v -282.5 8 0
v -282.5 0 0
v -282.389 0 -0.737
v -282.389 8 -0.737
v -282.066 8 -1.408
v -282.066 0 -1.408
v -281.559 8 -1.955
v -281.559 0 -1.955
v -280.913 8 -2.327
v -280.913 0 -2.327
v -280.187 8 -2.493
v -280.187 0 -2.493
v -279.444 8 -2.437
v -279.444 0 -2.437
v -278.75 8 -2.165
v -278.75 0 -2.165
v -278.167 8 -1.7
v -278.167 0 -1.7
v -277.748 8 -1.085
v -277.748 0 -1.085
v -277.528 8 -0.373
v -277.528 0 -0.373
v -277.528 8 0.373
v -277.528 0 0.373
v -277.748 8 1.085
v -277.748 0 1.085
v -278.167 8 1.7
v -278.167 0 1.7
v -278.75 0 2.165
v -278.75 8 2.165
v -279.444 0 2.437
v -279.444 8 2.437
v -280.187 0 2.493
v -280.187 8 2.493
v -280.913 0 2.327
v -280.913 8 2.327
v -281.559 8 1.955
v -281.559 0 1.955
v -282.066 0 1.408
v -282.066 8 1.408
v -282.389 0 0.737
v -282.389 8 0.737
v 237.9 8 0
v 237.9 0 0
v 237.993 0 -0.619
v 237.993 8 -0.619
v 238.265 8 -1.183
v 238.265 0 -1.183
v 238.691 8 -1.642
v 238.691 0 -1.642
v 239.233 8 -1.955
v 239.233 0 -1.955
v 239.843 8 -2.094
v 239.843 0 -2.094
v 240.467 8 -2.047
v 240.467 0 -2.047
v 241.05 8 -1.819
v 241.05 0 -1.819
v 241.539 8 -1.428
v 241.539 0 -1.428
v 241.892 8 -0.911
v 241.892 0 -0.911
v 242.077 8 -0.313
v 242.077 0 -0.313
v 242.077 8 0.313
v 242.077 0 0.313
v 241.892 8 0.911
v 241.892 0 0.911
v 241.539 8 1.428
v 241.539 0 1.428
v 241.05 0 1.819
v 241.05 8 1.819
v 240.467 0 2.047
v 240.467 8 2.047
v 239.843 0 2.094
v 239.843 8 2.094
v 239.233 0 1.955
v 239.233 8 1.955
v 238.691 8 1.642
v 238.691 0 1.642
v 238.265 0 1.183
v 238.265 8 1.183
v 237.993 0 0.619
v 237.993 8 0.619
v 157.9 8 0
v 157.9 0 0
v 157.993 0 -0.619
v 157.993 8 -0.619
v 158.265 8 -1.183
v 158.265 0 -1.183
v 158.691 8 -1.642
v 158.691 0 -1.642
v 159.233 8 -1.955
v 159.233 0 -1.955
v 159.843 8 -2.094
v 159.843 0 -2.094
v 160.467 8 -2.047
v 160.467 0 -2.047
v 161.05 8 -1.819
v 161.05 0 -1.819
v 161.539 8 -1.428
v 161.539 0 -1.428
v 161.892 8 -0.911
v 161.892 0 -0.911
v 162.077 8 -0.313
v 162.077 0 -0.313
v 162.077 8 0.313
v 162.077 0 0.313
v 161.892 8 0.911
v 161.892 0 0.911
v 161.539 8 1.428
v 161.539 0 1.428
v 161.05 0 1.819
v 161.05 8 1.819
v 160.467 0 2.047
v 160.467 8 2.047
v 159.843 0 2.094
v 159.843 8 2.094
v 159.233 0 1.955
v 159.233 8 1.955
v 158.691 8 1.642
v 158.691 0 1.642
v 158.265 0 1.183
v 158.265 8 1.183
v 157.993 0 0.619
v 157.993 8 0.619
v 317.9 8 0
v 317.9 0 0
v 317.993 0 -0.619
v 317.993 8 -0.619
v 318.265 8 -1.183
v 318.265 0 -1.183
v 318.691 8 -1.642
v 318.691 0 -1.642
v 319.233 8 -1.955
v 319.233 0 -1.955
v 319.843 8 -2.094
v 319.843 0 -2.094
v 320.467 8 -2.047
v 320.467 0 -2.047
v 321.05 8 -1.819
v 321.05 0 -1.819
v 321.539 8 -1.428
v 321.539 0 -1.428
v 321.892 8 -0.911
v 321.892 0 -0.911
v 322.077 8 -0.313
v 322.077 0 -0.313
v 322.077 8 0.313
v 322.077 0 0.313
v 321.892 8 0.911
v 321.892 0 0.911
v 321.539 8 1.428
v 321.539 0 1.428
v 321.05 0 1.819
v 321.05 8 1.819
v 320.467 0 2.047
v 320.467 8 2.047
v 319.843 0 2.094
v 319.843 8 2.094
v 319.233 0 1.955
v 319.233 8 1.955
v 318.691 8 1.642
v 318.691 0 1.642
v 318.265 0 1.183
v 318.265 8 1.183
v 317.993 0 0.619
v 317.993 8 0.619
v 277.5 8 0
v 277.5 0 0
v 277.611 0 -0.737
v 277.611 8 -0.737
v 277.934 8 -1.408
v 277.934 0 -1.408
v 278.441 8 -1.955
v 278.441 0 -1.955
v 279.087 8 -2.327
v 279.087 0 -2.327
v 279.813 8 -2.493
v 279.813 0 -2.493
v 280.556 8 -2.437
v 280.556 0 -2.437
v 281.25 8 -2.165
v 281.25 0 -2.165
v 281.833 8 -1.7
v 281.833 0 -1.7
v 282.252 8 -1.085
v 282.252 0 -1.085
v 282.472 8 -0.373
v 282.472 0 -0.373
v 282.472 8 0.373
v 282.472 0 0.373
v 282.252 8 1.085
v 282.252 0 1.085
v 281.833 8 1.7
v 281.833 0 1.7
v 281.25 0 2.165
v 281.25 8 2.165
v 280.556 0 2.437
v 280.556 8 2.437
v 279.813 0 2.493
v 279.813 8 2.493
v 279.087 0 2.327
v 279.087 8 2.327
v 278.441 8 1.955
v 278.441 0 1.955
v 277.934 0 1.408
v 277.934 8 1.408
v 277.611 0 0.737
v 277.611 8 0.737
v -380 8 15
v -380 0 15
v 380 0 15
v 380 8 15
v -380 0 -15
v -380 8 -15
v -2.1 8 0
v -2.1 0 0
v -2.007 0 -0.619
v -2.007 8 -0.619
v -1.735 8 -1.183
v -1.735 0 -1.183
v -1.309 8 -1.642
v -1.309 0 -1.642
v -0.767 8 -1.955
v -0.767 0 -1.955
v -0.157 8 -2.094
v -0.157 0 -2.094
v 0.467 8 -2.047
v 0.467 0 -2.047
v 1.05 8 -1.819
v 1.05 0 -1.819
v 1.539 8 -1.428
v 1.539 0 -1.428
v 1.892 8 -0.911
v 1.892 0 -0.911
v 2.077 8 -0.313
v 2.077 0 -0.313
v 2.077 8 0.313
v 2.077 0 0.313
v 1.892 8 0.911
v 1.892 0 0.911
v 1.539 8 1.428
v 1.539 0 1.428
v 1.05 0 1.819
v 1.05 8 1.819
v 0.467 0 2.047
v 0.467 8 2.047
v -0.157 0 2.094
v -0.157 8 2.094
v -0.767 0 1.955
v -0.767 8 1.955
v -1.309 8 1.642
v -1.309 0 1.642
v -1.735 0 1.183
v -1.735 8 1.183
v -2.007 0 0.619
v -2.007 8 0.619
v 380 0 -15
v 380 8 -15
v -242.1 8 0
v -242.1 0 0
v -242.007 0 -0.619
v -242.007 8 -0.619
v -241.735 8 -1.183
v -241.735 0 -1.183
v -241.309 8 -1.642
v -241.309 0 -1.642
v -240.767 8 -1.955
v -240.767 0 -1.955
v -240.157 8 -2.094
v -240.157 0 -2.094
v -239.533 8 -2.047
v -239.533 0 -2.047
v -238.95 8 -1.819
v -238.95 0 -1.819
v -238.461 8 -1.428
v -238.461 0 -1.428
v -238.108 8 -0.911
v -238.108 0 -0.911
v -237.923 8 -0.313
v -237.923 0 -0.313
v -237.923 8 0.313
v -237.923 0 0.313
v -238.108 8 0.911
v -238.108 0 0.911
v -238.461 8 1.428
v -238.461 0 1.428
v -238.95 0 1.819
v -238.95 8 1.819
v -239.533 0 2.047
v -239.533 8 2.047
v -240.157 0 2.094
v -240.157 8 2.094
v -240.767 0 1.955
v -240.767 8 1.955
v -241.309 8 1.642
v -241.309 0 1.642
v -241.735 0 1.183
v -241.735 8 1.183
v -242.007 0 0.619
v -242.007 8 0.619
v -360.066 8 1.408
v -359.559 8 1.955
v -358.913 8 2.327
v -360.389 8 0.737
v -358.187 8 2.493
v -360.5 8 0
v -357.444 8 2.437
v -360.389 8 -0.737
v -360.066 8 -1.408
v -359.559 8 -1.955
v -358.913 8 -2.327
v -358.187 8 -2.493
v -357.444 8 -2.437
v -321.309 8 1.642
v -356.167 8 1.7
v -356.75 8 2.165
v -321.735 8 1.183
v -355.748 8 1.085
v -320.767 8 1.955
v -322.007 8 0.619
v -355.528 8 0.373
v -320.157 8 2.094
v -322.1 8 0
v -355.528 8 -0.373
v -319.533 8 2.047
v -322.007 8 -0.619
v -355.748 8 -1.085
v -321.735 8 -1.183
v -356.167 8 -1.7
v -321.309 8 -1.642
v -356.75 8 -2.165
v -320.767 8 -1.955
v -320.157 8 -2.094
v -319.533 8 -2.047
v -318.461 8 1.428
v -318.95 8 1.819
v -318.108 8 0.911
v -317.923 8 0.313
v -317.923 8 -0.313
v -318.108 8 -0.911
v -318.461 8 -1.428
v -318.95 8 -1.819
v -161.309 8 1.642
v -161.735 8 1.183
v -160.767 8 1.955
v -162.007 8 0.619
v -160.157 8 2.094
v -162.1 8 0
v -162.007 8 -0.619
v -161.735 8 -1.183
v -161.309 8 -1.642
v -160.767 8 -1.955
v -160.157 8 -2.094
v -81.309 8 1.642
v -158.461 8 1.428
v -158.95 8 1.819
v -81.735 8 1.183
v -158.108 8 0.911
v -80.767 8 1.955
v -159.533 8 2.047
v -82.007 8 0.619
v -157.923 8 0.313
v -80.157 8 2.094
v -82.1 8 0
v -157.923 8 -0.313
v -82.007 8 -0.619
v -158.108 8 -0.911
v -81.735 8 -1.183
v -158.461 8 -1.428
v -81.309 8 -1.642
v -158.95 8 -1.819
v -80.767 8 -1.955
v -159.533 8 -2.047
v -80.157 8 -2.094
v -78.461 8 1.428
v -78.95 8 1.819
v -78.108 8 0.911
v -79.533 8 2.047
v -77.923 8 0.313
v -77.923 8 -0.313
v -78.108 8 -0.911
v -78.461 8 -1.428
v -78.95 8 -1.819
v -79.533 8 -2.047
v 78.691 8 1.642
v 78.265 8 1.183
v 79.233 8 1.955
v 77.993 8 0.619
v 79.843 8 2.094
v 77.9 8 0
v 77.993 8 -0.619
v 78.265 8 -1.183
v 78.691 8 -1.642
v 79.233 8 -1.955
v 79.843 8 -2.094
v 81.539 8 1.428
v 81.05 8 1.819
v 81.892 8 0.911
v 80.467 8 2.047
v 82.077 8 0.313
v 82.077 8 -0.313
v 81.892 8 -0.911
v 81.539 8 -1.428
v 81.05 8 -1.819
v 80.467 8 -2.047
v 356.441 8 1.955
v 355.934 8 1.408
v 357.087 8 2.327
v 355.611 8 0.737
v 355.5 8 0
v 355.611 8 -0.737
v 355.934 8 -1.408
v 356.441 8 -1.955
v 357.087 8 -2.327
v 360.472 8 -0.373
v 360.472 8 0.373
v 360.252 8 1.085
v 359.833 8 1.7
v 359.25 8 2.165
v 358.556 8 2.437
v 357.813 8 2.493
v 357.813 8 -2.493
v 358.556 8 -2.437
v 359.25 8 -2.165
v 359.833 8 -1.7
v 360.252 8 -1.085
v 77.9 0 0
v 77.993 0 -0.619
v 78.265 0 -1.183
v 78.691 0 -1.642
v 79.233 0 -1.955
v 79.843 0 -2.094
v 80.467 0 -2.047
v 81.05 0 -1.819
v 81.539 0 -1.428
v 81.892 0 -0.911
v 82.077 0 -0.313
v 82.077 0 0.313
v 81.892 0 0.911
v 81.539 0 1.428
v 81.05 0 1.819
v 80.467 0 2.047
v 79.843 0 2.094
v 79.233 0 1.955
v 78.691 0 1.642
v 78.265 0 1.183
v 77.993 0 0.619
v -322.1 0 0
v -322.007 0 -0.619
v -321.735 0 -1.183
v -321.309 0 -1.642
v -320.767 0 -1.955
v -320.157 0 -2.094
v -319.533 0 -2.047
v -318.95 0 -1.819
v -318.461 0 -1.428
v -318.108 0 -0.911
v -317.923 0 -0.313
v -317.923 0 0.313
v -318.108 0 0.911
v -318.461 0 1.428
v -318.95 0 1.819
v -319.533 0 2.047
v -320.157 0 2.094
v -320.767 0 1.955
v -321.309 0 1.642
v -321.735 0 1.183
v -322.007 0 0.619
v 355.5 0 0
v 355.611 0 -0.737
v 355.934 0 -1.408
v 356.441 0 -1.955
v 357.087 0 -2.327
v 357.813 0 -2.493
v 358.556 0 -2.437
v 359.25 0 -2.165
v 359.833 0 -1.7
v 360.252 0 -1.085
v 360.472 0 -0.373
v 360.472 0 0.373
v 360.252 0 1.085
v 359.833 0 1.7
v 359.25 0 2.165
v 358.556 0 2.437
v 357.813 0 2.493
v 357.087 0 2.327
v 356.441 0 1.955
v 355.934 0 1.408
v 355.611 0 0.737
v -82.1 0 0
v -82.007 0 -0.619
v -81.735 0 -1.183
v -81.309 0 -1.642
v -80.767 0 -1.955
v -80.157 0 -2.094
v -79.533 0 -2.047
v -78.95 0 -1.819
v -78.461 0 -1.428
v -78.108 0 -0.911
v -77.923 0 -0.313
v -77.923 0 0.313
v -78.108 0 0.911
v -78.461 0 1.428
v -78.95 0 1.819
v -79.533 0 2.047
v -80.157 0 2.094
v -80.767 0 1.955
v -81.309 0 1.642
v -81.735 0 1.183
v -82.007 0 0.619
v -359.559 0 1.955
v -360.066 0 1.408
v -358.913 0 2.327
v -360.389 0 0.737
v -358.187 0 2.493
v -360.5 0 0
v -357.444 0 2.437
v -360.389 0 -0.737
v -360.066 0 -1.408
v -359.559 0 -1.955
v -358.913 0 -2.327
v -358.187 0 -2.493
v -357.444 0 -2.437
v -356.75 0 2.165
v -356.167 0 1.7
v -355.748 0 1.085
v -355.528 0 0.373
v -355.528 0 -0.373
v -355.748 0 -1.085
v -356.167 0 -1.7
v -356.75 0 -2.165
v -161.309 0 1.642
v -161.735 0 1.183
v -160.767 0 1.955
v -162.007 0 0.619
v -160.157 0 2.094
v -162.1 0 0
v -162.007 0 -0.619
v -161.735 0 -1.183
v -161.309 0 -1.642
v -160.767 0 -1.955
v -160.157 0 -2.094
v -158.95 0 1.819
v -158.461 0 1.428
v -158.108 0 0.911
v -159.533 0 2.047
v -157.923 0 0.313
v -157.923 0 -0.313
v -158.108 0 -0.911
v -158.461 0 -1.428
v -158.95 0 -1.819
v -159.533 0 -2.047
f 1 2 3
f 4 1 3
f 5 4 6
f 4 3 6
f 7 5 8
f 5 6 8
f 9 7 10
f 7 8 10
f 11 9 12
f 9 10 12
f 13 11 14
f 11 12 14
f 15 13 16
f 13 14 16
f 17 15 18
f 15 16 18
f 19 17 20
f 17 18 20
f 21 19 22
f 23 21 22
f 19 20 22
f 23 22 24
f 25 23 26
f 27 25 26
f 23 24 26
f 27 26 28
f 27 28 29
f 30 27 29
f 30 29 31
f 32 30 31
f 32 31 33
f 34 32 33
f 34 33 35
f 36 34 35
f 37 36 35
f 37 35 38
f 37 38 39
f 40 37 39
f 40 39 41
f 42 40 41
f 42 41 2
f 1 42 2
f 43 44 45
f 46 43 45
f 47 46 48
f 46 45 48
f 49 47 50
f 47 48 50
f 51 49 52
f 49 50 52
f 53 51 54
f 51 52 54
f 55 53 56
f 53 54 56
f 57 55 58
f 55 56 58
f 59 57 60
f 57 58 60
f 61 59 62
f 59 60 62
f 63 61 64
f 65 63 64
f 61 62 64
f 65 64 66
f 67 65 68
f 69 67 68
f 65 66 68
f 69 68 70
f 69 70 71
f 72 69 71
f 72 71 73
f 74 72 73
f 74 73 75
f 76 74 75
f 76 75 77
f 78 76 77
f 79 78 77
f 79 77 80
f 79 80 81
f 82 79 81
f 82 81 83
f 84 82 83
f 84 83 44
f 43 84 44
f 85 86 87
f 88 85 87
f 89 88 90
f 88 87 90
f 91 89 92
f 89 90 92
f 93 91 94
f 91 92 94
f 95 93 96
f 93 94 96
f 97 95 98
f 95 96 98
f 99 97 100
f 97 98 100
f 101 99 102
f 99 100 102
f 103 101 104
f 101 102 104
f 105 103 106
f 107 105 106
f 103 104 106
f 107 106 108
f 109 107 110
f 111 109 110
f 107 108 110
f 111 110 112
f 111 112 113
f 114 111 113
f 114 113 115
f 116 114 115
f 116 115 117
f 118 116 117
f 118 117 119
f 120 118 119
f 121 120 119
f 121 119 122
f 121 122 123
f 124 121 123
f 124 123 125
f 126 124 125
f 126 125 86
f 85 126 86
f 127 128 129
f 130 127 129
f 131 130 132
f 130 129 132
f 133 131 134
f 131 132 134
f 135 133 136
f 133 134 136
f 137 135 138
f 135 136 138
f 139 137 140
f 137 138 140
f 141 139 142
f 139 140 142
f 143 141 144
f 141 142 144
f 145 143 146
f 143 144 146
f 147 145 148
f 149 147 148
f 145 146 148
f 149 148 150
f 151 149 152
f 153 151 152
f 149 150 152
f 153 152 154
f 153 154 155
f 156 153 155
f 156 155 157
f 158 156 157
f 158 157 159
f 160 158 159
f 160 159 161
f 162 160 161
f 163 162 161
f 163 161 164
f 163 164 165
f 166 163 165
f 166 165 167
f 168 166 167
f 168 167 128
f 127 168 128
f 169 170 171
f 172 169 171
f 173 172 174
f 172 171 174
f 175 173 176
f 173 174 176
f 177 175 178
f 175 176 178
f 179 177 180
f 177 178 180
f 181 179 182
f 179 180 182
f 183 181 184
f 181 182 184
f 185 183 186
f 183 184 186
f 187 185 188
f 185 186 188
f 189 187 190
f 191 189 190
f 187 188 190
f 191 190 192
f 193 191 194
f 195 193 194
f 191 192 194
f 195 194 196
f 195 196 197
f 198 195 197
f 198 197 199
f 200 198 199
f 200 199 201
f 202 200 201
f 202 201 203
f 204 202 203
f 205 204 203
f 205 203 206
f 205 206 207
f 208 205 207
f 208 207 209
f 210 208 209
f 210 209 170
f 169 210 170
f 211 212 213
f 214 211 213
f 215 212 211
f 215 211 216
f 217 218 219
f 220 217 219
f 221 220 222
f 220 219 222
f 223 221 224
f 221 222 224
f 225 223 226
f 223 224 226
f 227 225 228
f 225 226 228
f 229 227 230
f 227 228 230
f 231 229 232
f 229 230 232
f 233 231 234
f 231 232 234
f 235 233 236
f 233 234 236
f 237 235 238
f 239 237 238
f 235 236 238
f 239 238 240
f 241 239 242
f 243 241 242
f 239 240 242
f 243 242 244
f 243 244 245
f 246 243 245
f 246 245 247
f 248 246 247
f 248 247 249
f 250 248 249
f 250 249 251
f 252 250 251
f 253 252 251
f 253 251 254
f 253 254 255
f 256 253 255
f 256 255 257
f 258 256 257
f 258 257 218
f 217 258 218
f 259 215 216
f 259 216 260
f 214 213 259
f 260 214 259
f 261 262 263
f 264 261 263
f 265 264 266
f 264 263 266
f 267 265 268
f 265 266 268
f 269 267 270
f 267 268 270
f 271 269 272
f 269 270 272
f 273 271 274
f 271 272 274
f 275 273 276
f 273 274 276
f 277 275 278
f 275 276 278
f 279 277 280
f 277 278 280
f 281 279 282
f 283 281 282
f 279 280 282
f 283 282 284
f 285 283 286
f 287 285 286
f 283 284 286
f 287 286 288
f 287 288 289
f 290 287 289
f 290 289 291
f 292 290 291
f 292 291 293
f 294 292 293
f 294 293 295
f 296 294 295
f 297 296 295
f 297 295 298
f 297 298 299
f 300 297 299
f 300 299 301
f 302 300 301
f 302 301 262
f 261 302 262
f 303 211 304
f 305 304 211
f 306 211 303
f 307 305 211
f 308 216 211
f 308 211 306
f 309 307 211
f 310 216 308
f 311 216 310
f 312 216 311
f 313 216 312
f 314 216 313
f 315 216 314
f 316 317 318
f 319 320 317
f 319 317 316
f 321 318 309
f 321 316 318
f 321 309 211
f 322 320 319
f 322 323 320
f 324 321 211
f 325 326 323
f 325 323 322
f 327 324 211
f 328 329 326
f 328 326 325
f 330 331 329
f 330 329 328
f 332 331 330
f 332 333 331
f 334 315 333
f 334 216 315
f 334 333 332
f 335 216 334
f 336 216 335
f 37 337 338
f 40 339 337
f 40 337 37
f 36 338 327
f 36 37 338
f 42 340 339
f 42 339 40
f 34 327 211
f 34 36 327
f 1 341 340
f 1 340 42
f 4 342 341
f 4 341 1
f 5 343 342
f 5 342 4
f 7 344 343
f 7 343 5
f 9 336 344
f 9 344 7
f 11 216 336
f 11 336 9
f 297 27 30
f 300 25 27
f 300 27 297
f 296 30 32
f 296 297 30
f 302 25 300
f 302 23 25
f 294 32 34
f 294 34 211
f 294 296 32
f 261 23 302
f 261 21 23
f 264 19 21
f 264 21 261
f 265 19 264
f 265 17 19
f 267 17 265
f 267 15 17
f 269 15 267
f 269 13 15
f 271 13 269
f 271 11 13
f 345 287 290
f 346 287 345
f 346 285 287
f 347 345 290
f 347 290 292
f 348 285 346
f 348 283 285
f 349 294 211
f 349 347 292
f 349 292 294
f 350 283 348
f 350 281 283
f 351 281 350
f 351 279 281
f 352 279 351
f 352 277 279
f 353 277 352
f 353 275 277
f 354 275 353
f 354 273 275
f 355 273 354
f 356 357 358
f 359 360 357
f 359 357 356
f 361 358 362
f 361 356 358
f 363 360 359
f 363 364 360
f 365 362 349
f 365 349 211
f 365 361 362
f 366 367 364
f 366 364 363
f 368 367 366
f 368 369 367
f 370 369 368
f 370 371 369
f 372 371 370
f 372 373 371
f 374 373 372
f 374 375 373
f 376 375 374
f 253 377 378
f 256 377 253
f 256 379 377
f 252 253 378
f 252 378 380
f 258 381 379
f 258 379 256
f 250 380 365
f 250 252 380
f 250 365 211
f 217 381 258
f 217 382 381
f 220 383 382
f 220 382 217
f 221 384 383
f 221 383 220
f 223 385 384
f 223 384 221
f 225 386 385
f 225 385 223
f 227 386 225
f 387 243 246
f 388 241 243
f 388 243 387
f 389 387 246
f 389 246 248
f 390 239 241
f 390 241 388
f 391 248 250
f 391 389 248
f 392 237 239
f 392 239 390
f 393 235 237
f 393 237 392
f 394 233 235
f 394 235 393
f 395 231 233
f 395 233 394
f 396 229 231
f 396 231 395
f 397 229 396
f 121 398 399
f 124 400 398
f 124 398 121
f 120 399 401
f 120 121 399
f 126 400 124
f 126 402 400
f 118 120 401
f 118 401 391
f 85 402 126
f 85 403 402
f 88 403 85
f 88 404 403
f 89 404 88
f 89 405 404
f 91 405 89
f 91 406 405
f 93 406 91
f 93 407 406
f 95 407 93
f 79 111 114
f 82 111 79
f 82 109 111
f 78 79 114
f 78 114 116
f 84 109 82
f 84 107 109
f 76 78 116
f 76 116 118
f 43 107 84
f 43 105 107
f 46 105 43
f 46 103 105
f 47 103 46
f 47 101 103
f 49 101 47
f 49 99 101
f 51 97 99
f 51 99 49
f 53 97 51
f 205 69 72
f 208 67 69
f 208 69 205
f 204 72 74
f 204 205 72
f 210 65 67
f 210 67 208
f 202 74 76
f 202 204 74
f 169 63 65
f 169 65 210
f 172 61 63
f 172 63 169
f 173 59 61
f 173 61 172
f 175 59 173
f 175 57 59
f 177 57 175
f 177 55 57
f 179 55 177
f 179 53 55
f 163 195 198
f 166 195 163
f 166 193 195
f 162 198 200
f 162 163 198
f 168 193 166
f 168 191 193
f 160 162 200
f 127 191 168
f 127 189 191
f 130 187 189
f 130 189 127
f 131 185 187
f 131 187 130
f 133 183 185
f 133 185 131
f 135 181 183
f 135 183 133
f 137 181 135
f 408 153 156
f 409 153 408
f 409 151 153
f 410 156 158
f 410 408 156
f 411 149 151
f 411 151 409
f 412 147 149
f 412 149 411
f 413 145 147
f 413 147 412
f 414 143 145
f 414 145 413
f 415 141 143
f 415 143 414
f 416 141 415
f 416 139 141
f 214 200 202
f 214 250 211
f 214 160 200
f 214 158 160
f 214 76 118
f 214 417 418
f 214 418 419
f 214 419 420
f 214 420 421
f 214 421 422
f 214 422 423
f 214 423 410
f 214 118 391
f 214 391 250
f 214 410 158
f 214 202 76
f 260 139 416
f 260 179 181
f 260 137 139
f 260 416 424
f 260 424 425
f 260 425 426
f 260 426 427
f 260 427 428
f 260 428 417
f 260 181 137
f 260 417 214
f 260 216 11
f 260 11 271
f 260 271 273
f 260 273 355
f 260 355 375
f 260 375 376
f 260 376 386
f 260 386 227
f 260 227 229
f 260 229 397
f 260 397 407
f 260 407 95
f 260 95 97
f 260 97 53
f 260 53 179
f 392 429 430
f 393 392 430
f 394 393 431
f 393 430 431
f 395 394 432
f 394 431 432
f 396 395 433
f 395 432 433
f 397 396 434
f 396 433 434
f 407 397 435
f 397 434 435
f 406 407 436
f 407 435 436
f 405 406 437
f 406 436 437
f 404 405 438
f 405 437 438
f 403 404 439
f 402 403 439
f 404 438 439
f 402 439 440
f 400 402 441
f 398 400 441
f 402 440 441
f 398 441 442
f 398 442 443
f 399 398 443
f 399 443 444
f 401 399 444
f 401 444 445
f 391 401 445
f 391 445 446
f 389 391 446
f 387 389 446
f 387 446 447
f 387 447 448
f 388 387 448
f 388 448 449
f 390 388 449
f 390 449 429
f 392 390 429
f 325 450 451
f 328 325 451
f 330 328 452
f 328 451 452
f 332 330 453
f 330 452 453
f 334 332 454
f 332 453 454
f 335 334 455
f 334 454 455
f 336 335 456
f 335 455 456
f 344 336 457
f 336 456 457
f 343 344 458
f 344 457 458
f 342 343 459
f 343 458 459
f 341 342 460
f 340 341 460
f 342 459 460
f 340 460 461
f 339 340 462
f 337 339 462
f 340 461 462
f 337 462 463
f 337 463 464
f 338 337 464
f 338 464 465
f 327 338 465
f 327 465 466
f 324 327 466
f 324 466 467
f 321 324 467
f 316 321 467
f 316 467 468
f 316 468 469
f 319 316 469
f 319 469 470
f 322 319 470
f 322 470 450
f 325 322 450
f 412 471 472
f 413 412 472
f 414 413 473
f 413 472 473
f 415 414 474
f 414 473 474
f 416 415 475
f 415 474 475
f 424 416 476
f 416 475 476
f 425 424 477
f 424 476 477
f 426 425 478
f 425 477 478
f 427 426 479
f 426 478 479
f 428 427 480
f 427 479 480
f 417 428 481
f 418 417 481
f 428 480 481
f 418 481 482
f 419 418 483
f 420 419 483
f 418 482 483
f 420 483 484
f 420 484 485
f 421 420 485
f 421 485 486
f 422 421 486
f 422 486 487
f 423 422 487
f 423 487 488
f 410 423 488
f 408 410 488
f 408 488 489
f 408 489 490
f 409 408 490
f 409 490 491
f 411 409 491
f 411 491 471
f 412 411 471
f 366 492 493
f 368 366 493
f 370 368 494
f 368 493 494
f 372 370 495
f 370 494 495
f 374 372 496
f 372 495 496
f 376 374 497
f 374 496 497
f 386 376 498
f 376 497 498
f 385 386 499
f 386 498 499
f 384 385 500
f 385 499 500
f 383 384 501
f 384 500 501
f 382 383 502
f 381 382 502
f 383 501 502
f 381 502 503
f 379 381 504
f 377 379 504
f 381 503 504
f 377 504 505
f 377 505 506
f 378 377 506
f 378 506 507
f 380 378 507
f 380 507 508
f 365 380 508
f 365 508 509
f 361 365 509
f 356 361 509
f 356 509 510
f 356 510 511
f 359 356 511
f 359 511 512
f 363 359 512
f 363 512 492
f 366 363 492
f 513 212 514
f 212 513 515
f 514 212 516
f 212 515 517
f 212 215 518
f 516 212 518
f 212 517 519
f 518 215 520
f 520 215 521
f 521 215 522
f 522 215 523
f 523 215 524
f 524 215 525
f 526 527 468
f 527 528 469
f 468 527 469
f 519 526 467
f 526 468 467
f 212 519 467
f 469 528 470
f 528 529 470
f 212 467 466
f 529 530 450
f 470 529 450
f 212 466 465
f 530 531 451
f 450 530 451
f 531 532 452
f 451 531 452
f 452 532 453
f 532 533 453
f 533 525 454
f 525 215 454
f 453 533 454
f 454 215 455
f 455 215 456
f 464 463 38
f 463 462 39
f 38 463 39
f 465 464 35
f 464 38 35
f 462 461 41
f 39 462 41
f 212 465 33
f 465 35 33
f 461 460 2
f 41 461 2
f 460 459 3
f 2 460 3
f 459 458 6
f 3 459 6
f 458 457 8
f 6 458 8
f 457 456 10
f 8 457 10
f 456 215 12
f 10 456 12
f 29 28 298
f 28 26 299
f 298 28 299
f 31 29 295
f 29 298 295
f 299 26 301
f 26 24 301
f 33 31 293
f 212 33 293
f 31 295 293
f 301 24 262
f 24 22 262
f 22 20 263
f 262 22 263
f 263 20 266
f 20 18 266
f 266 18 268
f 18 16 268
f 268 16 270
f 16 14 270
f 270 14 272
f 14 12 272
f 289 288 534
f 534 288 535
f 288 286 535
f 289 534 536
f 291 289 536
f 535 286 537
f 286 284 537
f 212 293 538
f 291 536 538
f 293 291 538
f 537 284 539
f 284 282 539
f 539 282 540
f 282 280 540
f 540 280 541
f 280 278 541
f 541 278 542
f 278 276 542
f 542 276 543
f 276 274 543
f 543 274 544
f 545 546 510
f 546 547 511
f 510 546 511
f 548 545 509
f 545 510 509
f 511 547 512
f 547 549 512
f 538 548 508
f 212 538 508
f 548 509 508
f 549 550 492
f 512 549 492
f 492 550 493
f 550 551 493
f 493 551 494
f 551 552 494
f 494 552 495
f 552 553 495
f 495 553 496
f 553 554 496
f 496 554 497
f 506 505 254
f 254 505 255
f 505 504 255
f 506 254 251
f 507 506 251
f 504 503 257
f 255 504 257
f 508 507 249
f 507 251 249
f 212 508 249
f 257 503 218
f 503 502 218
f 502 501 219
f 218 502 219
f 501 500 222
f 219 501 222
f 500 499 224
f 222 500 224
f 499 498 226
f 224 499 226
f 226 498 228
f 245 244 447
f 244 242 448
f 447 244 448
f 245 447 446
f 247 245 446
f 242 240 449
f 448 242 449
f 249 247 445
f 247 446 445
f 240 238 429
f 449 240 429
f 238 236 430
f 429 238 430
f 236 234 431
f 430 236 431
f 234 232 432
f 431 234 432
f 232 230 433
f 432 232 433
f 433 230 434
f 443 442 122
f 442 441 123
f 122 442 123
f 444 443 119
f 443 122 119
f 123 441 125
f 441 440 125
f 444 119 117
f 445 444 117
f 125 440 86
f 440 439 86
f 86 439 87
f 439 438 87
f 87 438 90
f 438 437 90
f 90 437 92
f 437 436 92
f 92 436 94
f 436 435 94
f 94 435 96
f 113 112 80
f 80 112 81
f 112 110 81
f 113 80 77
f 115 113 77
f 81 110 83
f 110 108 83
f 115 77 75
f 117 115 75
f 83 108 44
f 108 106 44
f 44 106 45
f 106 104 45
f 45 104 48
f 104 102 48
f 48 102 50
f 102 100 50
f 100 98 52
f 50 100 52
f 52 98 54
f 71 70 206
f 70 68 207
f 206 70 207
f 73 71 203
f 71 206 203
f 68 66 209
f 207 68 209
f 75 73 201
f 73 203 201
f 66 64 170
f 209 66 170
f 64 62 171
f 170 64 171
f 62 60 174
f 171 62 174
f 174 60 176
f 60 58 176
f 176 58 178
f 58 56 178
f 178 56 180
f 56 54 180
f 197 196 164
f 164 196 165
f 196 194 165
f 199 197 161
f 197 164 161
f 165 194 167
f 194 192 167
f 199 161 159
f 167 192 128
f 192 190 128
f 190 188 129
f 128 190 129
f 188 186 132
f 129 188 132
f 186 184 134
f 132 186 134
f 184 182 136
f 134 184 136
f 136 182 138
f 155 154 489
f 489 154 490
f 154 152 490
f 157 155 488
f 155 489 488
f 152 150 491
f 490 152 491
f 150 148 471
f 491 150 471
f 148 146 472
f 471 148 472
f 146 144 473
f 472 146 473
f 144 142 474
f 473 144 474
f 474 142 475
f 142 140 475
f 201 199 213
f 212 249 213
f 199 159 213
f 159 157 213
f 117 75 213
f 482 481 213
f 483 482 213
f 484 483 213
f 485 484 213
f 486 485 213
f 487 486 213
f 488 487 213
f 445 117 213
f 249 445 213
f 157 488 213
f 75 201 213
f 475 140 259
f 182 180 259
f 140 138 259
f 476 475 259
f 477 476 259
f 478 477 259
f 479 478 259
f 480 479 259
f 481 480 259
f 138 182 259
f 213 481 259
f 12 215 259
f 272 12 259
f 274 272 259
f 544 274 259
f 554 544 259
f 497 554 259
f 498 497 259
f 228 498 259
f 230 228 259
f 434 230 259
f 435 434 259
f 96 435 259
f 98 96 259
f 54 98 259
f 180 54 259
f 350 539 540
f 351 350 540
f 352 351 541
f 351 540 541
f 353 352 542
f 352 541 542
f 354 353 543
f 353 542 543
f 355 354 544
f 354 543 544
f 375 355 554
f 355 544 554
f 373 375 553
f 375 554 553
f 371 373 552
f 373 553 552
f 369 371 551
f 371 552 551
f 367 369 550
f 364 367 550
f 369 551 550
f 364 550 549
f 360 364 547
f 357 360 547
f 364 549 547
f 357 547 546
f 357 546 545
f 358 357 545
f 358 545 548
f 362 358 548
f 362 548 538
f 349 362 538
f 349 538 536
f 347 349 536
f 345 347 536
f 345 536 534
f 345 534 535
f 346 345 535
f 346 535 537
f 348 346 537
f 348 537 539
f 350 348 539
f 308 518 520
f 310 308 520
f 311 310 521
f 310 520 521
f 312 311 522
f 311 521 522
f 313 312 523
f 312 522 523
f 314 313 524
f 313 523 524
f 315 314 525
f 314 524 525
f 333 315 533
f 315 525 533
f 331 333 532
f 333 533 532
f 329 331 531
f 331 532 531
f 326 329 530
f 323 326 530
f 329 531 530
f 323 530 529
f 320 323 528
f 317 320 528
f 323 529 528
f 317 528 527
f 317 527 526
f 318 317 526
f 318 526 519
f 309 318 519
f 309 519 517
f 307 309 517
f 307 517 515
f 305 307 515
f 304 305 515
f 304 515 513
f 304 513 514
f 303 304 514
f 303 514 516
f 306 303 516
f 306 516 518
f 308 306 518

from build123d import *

# Parameters (mm, degrees)
SKETCH1_W           = 760
SKETCH1_H           = 30
BOSS_EXTRUDE1_DEPTH = 8
M6_TAPPED_HOLE1_D   = 5
M5_TAPPED_HOLE1_D   = 4.2


with BuildPart() as part:
    # Sketch1 → Boss-Extrude1 (new body)
    with BuildSketch(Plane(origin=(0, 0, 0), x_dir=(1, 0, 0), z_dir=(0, 1, 0))):
        Rectangle(SKETCH1_W, SKETCH1_H)
    extrude(amount=BOSS_EXTRUDE1_DEPTH)

    # M6 Tapped Hole1 (through all)
    with Locations(Plane(origin=(0, 8, 0), x_dir=(1, 0, 0), z_dir=(0, 1, 0))):
        with Locations((-358, 0), (-280, 0), (280, 0), (358, 0)):
            Hole(M6_TAPPED_HOLE1_D / 2)

    # M5 Tapped Hole1 (through all)
    with Locations(Plane(origin=(0, 8, 0), x_dir=(1, 0, 0), z_dir=(0, 1, 0))):
        with Locations((0, 0), (80, 0), (160, 0), (240, 0), (320, 0), (-80, 0), (-160, 0), (-240, 0), (-320, 0)):
            Hole(M5_TAPPED_HOLE1_D / 2)


solid = part.part
